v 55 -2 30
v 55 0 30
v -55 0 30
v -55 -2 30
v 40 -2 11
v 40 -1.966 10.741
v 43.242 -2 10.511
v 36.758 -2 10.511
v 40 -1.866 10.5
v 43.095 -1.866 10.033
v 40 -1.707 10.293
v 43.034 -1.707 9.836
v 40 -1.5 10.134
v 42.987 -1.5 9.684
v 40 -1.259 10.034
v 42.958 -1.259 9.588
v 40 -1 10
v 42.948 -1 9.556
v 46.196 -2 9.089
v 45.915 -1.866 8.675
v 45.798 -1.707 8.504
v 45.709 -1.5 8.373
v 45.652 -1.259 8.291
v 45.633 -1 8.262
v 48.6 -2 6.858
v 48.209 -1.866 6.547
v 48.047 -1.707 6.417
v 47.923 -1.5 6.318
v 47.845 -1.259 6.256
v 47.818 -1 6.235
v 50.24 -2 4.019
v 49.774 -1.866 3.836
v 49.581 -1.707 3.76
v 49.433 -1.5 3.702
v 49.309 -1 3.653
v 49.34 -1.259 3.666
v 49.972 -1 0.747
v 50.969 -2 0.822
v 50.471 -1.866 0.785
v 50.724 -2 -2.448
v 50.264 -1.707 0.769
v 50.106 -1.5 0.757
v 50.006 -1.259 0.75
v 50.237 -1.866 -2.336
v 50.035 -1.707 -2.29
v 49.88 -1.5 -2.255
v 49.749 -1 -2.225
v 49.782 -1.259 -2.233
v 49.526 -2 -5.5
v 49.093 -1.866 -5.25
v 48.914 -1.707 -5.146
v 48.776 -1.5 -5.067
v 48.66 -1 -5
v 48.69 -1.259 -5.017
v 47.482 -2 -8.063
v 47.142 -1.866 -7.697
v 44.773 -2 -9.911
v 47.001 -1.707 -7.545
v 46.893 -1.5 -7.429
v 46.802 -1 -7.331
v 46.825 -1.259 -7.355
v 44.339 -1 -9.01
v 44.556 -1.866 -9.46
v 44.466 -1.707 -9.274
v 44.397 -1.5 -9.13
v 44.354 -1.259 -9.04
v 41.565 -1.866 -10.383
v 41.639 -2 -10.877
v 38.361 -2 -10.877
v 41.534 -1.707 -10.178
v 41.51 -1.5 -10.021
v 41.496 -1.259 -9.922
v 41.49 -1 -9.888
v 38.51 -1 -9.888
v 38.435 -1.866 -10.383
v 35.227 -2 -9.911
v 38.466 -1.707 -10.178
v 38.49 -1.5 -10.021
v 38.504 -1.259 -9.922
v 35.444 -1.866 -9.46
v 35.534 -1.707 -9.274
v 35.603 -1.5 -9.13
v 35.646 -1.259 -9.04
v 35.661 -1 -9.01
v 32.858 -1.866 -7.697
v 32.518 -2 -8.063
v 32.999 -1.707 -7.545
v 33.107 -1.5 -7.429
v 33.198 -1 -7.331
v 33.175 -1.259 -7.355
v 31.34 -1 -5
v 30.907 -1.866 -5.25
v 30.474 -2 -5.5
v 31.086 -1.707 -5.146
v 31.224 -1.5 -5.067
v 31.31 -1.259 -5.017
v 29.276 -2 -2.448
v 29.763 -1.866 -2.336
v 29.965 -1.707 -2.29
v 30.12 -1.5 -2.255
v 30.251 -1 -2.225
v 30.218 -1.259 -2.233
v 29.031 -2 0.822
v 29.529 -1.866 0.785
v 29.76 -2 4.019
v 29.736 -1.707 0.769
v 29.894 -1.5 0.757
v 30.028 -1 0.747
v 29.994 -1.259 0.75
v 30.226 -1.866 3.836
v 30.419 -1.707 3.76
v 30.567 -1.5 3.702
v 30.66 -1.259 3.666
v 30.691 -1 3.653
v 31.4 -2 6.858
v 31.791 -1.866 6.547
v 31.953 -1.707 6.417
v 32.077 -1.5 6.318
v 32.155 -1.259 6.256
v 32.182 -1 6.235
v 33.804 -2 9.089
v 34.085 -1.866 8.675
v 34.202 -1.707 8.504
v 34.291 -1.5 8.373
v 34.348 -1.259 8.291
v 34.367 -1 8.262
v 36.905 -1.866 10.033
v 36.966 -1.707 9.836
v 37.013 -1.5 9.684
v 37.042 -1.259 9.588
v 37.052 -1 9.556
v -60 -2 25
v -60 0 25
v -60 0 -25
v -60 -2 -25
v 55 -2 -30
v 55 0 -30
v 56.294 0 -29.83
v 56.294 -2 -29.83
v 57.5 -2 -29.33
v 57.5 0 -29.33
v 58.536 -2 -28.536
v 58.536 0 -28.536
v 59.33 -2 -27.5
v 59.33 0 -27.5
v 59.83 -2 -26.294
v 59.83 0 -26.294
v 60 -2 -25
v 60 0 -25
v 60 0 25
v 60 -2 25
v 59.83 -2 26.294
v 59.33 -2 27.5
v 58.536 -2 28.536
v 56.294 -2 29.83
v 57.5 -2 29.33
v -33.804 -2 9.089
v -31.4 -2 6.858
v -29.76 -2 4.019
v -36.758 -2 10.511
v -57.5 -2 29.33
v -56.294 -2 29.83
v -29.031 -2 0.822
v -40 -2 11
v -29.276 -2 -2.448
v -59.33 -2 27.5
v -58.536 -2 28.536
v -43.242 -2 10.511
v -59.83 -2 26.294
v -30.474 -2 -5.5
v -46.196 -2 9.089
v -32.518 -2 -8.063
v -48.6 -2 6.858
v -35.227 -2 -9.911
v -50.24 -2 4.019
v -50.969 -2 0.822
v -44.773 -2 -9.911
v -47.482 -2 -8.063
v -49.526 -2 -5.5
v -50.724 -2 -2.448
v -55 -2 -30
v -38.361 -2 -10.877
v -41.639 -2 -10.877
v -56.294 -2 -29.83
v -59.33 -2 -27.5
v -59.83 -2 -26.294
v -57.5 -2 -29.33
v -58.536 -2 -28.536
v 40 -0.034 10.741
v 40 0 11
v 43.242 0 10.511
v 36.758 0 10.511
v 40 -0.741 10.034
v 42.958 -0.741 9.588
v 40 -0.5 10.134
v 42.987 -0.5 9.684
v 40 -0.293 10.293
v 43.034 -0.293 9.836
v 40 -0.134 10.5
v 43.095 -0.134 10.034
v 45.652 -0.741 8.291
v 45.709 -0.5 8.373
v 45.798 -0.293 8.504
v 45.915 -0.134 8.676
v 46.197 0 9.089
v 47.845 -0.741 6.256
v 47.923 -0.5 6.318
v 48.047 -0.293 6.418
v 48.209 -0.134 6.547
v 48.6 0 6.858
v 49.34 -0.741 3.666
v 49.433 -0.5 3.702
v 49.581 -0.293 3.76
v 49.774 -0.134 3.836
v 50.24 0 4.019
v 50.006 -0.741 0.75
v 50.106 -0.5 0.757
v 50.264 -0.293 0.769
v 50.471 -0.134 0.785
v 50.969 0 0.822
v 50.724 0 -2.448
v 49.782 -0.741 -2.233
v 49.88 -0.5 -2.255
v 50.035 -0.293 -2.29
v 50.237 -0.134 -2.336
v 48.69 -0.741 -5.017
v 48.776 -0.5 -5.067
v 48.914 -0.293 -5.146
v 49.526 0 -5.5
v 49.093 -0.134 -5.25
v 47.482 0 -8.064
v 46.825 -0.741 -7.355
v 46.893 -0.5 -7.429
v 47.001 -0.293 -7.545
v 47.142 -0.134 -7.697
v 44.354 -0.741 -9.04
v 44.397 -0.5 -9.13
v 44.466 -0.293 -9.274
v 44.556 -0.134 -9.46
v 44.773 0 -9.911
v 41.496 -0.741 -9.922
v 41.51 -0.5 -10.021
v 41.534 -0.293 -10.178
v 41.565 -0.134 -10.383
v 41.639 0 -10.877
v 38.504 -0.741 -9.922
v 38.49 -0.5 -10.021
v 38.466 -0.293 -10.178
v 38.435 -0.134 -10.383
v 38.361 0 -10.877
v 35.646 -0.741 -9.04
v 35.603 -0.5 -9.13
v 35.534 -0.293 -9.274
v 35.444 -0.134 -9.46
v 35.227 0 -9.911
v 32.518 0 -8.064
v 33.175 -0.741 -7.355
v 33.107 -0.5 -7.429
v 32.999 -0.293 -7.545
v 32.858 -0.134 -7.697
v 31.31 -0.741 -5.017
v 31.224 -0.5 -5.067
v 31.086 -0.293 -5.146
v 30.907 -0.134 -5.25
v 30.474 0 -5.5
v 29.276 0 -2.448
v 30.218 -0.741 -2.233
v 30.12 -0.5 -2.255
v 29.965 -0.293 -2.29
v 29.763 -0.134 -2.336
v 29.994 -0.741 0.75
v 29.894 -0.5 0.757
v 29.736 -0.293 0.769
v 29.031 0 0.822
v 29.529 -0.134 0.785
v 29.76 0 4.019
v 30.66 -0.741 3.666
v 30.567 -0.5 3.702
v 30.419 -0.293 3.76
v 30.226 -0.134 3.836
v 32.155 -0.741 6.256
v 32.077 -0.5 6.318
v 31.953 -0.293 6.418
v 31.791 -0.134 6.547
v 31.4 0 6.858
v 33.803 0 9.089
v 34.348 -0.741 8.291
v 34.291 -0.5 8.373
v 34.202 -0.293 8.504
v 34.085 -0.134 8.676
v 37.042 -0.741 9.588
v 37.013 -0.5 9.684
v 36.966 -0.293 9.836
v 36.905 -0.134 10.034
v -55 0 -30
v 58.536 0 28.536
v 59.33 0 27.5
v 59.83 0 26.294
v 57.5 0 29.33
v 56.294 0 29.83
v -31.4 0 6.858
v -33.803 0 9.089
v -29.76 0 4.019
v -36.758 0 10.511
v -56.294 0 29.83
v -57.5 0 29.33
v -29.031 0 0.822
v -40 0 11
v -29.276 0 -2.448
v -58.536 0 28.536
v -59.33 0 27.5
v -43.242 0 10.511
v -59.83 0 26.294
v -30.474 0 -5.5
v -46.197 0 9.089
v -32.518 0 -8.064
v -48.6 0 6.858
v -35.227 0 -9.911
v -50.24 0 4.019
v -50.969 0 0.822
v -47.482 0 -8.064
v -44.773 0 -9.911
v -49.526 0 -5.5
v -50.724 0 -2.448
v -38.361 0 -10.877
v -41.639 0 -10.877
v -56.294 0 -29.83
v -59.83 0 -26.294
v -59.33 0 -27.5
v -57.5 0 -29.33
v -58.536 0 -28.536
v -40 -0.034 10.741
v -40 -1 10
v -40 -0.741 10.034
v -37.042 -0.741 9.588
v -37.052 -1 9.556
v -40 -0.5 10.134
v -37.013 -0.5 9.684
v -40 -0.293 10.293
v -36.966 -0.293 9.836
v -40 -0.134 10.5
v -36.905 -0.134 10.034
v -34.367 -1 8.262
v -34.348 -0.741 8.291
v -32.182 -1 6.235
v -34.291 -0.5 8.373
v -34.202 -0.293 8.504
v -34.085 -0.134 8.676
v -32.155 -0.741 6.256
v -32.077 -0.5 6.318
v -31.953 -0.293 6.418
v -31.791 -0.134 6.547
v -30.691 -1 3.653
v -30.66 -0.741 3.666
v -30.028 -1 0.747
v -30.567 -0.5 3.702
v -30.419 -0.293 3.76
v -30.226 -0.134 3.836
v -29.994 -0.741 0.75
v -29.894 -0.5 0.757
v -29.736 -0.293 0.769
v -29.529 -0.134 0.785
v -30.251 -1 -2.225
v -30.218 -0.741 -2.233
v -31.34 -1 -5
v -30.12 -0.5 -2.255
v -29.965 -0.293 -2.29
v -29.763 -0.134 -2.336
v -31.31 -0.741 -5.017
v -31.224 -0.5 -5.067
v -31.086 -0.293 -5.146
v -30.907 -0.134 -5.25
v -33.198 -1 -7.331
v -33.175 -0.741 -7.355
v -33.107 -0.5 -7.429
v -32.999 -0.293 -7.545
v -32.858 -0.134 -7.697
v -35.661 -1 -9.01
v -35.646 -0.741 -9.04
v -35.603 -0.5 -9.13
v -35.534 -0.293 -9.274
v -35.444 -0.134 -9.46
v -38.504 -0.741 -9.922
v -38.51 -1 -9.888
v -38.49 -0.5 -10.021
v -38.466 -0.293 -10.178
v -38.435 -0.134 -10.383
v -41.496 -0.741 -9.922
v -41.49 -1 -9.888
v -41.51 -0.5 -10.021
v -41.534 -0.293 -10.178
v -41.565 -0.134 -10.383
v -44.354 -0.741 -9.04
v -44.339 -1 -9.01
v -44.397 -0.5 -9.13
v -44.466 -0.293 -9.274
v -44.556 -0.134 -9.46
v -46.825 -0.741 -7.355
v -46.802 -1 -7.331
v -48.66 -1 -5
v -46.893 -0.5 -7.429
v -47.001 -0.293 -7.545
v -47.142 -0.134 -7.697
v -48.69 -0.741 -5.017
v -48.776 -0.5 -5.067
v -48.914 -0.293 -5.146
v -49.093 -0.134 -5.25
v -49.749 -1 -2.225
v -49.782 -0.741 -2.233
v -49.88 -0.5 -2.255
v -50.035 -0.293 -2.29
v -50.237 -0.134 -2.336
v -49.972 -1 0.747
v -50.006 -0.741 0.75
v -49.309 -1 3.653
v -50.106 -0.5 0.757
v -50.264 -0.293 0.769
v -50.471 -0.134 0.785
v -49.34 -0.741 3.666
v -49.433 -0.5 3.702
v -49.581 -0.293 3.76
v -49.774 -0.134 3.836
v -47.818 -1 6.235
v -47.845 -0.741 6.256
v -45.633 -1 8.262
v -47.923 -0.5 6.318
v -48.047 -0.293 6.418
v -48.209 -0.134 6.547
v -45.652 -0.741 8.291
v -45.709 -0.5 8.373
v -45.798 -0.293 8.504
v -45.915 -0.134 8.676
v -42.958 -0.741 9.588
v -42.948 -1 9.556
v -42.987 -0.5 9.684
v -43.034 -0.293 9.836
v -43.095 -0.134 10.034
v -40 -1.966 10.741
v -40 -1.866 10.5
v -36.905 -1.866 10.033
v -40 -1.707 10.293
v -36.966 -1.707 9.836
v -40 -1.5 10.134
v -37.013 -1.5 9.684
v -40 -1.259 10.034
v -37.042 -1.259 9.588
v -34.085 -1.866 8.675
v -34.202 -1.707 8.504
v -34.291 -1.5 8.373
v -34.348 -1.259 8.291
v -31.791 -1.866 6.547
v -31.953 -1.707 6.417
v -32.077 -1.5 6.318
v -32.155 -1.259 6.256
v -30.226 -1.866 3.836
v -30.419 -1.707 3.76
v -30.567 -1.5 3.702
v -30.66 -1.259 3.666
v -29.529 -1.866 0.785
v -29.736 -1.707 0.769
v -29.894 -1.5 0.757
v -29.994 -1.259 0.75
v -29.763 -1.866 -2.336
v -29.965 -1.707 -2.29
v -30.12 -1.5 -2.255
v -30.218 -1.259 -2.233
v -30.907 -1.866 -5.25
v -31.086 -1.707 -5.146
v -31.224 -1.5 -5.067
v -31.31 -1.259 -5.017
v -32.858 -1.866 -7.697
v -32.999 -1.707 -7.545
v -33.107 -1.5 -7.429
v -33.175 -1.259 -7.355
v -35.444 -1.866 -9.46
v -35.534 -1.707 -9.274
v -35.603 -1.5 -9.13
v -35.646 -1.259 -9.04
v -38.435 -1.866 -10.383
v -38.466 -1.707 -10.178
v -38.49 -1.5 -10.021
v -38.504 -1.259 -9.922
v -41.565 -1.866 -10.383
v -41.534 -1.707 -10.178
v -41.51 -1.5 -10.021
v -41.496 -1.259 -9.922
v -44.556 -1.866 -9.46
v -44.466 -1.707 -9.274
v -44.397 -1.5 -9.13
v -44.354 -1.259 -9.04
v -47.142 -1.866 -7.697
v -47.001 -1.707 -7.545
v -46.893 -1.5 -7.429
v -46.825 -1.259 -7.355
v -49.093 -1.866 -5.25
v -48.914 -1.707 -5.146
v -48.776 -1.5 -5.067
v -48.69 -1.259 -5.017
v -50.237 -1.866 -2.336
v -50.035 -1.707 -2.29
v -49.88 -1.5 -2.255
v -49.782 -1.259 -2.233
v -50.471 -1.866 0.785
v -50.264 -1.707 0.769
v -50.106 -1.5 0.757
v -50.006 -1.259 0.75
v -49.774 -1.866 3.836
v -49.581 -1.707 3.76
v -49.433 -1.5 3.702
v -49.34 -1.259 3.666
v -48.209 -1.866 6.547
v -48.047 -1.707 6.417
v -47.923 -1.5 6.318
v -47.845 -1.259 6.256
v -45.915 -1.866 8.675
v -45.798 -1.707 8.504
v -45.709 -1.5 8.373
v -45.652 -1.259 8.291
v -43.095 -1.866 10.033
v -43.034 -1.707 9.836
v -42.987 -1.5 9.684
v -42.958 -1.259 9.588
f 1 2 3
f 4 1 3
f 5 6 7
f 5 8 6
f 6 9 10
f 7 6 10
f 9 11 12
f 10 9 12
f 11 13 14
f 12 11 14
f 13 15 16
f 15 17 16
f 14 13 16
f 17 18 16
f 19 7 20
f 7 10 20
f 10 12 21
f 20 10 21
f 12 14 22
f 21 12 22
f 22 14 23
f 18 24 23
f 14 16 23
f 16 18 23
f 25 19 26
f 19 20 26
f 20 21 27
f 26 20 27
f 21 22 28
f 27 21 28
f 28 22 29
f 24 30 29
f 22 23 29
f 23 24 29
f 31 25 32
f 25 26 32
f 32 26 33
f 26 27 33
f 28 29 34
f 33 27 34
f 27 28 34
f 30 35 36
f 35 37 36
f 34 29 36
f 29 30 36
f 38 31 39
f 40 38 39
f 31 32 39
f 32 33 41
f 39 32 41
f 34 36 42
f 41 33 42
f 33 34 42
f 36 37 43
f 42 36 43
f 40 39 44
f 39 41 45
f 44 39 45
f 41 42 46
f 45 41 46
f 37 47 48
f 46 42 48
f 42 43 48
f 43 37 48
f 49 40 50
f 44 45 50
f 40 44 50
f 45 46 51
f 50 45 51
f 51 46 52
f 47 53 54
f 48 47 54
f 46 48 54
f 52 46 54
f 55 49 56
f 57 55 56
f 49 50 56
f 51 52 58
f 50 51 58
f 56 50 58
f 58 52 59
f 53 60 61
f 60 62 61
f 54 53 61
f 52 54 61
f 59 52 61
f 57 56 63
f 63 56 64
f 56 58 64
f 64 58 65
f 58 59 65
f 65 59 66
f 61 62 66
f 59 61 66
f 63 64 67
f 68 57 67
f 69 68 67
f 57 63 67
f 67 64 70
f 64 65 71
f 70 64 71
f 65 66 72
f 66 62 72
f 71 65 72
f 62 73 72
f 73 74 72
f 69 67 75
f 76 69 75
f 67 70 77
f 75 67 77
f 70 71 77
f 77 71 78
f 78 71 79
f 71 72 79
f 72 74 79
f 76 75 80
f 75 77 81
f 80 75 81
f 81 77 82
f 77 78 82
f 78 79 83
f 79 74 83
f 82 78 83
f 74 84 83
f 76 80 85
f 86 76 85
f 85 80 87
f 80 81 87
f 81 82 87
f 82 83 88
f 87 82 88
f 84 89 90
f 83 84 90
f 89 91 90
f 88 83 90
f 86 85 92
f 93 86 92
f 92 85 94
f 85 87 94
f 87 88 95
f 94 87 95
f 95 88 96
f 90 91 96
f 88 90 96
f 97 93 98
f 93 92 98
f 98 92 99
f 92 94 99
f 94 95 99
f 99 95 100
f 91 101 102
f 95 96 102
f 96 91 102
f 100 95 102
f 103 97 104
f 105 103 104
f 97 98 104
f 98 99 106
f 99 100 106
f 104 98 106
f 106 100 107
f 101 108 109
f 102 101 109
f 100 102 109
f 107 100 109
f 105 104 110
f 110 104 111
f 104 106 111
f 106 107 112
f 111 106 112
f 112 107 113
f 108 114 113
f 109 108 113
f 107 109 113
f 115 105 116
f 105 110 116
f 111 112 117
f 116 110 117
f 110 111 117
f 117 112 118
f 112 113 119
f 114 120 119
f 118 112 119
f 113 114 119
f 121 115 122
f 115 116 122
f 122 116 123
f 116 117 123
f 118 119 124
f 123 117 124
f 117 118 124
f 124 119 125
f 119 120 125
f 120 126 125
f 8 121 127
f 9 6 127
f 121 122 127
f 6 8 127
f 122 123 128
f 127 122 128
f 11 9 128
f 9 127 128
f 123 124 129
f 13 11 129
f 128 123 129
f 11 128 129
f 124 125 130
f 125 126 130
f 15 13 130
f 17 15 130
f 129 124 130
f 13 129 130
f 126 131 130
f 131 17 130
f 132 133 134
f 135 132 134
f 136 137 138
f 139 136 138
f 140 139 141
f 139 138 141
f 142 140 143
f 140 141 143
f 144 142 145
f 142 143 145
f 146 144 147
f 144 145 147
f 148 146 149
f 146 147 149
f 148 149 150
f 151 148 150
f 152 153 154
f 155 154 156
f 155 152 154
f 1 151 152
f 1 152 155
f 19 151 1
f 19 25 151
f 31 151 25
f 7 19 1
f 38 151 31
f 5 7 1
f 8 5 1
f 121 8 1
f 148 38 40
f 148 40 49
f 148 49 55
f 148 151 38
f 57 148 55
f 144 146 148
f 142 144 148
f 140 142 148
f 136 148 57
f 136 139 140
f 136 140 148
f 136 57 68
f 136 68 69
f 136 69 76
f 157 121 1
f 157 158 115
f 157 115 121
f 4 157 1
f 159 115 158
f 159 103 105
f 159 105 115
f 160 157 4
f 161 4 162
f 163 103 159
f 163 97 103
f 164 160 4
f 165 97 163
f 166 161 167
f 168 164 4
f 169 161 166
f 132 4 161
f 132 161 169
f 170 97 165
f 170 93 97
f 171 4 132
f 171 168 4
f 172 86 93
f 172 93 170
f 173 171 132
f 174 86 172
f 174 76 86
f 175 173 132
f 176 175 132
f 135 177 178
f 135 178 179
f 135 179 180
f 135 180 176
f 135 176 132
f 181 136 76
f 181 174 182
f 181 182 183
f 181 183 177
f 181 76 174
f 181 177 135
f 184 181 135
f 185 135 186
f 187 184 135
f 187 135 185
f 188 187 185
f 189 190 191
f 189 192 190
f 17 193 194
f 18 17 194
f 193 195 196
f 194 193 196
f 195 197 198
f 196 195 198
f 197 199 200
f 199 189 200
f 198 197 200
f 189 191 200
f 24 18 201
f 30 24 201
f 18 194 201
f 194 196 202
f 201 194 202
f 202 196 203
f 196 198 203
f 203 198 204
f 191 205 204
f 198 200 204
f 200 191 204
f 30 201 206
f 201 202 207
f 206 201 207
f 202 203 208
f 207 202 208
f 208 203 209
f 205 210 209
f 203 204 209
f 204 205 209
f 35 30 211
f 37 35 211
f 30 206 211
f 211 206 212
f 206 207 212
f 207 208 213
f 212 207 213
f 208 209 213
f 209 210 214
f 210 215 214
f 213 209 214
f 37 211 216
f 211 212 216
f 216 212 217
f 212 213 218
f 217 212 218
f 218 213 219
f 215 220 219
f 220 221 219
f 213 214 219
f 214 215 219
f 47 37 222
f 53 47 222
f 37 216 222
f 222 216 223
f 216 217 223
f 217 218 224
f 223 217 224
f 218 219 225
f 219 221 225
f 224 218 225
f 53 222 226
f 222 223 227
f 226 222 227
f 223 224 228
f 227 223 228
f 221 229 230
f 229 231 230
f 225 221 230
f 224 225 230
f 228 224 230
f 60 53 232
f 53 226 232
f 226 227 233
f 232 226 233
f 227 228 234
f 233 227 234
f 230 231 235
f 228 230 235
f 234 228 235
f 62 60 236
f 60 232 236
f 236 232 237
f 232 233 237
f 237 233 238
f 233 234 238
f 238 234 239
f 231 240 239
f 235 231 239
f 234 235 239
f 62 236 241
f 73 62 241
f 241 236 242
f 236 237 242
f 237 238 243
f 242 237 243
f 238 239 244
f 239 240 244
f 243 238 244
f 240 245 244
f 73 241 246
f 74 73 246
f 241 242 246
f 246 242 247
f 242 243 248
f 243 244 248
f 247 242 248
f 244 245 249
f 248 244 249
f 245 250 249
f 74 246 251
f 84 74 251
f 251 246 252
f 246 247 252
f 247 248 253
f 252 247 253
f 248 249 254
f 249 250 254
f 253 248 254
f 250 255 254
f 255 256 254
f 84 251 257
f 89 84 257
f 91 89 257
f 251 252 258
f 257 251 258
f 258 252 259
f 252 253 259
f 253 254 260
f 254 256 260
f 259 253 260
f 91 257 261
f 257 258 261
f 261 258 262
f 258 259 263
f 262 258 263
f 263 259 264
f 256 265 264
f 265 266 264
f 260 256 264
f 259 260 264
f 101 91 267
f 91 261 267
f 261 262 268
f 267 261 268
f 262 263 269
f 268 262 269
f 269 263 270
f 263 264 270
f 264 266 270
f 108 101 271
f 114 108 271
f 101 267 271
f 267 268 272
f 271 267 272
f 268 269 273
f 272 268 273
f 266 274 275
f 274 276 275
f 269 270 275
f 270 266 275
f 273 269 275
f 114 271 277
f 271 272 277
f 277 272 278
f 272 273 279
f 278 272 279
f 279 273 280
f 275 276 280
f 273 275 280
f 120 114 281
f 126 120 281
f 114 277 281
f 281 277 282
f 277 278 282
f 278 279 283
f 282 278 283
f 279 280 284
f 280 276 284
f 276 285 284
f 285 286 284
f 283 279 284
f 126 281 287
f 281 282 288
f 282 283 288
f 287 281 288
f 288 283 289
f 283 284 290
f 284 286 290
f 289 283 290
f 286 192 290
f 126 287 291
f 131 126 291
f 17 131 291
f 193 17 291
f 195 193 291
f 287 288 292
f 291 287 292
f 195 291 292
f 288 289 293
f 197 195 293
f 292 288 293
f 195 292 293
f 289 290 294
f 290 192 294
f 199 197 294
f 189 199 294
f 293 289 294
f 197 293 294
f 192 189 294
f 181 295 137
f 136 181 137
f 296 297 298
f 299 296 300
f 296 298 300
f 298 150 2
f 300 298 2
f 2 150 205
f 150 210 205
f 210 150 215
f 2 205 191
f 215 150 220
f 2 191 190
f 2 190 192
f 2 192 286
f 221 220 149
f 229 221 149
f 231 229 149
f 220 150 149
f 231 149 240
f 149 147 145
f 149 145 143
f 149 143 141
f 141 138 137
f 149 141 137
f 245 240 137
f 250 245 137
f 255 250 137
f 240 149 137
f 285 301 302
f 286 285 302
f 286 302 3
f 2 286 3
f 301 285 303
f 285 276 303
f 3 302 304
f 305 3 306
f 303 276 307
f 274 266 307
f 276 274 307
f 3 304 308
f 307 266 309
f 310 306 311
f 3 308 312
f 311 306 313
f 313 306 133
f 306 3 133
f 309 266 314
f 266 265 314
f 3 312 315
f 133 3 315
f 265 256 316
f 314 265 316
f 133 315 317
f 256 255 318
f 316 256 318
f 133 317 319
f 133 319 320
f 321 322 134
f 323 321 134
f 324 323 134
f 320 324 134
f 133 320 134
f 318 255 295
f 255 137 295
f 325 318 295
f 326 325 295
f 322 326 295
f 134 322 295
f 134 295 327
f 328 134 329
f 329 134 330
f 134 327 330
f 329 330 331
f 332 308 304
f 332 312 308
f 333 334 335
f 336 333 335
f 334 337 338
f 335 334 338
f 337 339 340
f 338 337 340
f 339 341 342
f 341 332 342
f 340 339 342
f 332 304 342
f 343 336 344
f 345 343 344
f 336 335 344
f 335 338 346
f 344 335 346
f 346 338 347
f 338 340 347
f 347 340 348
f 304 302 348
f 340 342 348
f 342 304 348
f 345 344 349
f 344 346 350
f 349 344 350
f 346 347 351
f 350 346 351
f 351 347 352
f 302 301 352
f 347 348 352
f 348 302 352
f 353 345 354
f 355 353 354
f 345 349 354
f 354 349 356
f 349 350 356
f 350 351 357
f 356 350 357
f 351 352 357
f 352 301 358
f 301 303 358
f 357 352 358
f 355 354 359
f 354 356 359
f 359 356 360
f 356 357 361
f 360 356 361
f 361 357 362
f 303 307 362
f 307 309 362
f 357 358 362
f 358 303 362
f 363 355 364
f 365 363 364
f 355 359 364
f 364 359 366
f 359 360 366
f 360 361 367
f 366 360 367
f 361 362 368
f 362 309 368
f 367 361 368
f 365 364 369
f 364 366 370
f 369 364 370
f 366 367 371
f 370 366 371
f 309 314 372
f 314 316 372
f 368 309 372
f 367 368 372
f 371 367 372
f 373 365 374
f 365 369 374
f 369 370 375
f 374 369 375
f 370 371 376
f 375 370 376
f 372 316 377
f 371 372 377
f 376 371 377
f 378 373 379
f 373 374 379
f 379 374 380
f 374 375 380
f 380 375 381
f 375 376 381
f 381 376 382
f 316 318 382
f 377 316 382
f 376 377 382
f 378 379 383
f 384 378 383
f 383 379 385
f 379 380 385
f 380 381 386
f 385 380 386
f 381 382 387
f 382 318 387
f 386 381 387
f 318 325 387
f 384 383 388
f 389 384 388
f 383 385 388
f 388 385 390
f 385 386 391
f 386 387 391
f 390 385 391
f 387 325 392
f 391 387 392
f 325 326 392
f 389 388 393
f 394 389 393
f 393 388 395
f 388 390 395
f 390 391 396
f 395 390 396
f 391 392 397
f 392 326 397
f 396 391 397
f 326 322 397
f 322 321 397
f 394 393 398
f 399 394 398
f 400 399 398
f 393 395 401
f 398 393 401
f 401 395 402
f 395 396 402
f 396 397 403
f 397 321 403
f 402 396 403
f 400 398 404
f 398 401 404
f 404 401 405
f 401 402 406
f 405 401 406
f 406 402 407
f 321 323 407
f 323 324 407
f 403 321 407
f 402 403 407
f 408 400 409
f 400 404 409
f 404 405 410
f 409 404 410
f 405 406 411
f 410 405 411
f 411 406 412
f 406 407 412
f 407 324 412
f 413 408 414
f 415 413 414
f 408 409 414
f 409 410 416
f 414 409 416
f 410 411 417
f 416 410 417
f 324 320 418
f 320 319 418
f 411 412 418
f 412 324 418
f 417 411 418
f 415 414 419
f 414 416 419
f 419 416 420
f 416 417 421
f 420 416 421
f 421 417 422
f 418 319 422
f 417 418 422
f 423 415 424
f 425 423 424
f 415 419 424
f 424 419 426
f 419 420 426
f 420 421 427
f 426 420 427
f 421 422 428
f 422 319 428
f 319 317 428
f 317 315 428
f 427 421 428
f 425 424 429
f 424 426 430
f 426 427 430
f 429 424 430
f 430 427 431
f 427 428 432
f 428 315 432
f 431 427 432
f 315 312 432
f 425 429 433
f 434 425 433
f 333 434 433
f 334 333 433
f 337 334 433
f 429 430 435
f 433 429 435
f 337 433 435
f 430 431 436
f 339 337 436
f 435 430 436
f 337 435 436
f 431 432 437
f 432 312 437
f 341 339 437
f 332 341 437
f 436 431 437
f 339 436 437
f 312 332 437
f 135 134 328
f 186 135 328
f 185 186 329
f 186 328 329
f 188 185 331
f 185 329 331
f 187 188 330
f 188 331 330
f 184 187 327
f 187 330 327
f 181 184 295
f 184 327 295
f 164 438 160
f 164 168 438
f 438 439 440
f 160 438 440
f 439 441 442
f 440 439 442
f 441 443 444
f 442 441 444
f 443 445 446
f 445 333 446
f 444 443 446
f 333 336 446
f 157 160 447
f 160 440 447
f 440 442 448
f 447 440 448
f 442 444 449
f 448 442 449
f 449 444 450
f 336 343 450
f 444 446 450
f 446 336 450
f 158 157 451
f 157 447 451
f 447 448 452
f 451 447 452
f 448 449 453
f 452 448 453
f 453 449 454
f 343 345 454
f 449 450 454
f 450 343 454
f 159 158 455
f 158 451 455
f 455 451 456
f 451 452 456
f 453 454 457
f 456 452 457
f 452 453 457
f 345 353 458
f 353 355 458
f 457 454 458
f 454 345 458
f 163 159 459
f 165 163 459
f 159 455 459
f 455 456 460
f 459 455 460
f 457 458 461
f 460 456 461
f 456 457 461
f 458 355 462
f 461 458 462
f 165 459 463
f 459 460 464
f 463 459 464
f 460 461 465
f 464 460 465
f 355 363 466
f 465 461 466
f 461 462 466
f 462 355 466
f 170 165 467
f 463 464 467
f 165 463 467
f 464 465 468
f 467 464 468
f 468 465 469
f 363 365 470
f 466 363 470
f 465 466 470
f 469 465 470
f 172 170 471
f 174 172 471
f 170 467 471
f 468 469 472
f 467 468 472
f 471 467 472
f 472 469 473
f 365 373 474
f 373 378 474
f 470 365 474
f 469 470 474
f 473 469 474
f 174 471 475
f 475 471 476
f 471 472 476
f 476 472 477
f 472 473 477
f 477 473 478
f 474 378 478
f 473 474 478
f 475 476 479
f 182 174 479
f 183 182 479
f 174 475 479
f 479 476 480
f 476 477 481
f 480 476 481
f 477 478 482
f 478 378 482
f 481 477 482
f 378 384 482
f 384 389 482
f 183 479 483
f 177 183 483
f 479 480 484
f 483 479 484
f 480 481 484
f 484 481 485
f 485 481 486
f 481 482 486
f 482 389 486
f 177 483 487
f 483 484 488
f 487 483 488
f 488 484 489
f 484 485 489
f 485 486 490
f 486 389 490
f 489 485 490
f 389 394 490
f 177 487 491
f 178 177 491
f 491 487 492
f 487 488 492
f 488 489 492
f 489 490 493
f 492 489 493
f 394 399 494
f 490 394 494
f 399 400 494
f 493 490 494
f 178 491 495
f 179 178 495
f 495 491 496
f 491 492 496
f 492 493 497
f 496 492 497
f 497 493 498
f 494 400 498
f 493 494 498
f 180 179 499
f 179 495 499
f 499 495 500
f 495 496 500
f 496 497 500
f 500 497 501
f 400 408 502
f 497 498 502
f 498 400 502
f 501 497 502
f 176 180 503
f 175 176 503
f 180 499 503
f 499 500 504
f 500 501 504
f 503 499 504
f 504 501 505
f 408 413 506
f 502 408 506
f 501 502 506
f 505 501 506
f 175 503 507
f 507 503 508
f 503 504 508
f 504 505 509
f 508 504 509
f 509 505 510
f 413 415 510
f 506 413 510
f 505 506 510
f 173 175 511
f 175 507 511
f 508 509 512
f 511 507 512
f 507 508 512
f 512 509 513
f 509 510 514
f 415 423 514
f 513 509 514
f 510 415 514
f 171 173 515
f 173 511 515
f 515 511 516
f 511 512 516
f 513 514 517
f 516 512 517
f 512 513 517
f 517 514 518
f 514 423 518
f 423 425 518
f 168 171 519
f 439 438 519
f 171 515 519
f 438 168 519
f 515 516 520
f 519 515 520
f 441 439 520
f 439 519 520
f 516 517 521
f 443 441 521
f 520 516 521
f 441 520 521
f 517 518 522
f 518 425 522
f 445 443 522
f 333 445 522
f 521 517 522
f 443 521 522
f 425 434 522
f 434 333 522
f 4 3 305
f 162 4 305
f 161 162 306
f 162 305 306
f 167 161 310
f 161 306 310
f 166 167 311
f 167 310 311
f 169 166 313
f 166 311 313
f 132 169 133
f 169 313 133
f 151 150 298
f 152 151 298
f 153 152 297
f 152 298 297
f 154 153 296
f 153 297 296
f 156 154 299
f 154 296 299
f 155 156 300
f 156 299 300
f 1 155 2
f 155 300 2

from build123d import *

# Parameters (mm, degrees)
SKETCH1_R          = 10
BASE_FLANGE1_DEPTH = 2
FILLET1_R          = 1
FILLET2_R          = 1
FILLET3_R          = 1


# Sheet-metal steps are written as plain solids
with BuildPart() as part:
    # Sketch1 → Base-Flange1 (new body)
    with BuildSketch(Plane(origin=(0, 0, 0), x_dir=(1, 0, 0), z_dir=(0, 1, 0))):
        with BuildLine():
            Line((55, -30), (-55, -30))
            ThreePointArc((-55, -30), (-58.535533906, -28.535533906), (-60, -25))
            Line((-60, -25), (-60, 25))
            ThreePointArc((-60, 25), (-58.535533906, 28.535533906), (-55, 30))
            Line((-55, 30), (55, 30))
            ThreePointArc((55, 30), (58.535533906, 28.535533906), (60, 25))
            Line((60, 25), (60, -25))
            ThreePointArc((60, -25), (58.535533906, -28.535533906), (55, -30))
        make_face()
        with Locations(Location((-40, 0, 0), (0, 0, 270))):
            Circle(SKETCH1_R, mode=Mode.SUBTRACT)
        with Locations(Location((40, 0, 0), (0, 0, 270))):
            Circle(SKETCH1_R, mode=Mode.SUBTRACT)
    extrude(amount=-BASE_FLANGE1_DEPTH)

    # Fillet1
    fillet1_edges = [part.edges().sort_by_distance(p)[0] for p in [
        (-40, 0, -10),
        (40, 0, -10),
    ]]
    fillet(fillet1_edges, radius=FILLET1_R)

    # Fillet2
    fillet2_edges = [part.edges().sort_by_distance(p)[0] for p in [
        (-40, -2, -10),
    ]]
    fillet(fillet2_edges, radius=FILLET2_R - 0.0001)  # a hair under: the kernel refuses the full size

    # Fillet3
    fillet3_edges = [part.edges().sort_by_distance(p)[0] for p in [
        (40, -2, -10),
    ]]
    fillet(fillet3_edges, radius=FILLET3_R - 0.0001)  # a hair under: the kernel refuses the full size


solid = part.part
